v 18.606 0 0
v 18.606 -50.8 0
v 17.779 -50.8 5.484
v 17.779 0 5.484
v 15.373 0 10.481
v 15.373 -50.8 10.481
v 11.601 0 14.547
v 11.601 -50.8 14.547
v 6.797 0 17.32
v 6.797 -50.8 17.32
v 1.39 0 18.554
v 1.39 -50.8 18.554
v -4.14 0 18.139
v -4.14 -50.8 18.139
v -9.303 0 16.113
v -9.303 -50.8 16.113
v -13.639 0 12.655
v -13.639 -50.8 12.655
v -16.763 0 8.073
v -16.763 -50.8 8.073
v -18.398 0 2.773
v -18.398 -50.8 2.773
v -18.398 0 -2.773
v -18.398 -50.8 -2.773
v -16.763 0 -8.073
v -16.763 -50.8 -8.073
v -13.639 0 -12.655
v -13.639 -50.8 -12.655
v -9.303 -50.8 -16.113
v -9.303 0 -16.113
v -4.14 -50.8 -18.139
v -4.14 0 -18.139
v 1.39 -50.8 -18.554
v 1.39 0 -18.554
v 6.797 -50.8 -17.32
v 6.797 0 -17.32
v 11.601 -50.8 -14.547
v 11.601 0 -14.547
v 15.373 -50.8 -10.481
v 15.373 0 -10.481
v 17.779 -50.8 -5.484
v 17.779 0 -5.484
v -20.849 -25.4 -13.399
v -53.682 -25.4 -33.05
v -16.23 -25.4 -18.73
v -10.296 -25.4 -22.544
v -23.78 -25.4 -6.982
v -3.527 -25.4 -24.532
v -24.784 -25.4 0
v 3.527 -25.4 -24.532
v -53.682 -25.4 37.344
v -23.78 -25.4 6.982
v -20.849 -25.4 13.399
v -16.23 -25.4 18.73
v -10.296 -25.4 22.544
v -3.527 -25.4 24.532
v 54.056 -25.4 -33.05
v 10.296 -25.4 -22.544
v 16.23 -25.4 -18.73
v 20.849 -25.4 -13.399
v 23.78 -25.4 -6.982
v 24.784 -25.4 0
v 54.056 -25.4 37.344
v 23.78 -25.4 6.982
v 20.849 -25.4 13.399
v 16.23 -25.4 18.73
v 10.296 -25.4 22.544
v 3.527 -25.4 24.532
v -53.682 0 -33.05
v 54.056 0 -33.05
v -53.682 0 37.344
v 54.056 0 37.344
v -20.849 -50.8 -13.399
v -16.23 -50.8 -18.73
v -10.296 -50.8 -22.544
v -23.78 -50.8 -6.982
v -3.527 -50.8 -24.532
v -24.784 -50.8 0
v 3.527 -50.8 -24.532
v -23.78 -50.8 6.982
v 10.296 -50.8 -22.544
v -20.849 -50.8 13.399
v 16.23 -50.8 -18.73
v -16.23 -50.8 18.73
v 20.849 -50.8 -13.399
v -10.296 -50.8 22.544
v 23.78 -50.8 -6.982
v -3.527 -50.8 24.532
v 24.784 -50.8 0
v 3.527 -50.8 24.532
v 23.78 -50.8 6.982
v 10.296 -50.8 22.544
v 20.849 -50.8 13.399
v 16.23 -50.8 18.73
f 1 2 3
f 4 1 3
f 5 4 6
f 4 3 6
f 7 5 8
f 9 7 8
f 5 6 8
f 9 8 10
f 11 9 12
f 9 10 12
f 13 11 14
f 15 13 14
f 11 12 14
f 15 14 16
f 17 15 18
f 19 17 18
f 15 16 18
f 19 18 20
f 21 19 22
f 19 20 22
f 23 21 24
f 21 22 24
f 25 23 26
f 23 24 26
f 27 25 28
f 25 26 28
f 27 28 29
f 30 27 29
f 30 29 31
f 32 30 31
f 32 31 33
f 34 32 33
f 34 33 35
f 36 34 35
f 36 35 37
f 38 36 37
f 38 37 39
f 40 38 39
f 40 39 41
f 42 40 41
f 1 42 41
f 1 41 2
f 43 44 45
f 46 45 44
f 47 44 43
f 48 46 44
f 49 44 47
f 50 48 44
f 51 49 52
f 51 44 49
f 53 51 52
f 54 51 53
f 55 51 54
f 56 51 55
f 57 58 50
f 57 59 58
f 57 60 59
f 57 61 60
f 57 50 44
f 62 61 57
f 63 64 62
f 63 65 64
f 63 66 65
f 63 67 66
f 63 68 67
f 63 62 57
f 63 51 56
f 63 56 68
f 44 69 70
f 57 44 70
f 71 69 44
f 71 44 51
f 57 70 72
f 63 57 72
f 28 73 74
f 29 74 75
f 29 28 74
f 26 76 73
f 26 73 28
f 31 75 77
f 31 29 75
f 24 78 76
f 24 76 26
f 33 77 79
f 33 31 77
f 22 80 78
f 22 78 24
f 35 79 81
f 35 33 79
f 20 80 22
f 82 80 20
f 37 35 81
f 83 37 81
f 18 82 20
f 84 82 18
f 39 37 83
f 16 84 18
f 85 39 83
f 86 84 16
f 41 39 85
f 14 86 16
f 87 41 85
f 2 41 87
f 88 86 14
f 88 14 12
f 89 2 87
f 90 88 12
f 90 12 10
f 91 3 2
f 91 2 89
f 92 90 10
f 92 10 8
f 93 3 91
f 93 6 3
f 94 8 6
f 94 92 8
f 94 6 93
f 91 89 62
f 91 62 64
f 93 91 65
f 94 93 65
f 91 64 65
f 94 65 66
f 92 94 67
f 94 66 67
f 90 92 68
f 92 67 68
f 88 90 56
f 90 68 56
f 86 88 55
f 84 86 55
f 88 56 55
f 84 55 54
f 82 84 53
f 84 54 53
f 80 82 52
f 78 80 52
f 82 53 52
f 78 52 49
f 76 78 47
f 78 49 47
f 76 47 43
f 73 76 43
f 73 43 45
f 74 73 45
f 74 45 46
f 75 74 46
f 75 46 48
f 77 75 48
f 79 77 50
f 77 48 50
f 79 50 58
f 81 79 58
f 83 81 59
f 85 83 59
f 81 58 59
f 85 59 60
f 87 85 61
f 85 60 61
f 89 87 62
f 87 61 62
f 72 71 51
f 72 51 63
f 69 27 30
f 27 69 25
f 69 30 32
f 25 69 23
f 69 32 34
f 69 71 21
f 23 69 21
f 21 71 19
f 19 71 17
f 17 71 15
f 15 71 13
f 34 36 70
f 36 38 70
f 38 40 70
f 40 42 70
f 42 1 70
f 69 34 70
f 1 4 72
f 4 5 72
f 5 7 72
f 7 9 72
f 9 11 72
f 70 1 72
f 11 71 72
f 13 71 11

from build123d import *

# Parameters (mm, degrees)
F0_W     = 107.738086
F0_H     = 70.393864
F1_DEPTH = 25.4
F2_R     = 24.783806
F3_DEPTH = 25.4
F4_R     = 18.605806
F5_DEPTH = 76.2


with BuildPart() as f1:
    # F0 (on Front) → F1 (new body)
    with BuildSketch(Plane.XZ):
        with Locations((0.186719, 2.147293)):
            Rectangle(F0_W, F0_H)
    extrude(amount=F1_DEPTH)

    # F2 (on face) → F3 (join)
    with BuildSketch(Plane.XZ.offset(25.4)):
        Circle(F2_R)
    extrude(amount=F3_DEPTH)

    # F4 (on face) → F5 (cut)
    with BuildSketch(Plane.XZ.offset(50.8)):
        Circle(F4_R)
    extrude(amount=-F5_DEPTH, mode=Mode.SUBTRACT)


solid = f1.part
